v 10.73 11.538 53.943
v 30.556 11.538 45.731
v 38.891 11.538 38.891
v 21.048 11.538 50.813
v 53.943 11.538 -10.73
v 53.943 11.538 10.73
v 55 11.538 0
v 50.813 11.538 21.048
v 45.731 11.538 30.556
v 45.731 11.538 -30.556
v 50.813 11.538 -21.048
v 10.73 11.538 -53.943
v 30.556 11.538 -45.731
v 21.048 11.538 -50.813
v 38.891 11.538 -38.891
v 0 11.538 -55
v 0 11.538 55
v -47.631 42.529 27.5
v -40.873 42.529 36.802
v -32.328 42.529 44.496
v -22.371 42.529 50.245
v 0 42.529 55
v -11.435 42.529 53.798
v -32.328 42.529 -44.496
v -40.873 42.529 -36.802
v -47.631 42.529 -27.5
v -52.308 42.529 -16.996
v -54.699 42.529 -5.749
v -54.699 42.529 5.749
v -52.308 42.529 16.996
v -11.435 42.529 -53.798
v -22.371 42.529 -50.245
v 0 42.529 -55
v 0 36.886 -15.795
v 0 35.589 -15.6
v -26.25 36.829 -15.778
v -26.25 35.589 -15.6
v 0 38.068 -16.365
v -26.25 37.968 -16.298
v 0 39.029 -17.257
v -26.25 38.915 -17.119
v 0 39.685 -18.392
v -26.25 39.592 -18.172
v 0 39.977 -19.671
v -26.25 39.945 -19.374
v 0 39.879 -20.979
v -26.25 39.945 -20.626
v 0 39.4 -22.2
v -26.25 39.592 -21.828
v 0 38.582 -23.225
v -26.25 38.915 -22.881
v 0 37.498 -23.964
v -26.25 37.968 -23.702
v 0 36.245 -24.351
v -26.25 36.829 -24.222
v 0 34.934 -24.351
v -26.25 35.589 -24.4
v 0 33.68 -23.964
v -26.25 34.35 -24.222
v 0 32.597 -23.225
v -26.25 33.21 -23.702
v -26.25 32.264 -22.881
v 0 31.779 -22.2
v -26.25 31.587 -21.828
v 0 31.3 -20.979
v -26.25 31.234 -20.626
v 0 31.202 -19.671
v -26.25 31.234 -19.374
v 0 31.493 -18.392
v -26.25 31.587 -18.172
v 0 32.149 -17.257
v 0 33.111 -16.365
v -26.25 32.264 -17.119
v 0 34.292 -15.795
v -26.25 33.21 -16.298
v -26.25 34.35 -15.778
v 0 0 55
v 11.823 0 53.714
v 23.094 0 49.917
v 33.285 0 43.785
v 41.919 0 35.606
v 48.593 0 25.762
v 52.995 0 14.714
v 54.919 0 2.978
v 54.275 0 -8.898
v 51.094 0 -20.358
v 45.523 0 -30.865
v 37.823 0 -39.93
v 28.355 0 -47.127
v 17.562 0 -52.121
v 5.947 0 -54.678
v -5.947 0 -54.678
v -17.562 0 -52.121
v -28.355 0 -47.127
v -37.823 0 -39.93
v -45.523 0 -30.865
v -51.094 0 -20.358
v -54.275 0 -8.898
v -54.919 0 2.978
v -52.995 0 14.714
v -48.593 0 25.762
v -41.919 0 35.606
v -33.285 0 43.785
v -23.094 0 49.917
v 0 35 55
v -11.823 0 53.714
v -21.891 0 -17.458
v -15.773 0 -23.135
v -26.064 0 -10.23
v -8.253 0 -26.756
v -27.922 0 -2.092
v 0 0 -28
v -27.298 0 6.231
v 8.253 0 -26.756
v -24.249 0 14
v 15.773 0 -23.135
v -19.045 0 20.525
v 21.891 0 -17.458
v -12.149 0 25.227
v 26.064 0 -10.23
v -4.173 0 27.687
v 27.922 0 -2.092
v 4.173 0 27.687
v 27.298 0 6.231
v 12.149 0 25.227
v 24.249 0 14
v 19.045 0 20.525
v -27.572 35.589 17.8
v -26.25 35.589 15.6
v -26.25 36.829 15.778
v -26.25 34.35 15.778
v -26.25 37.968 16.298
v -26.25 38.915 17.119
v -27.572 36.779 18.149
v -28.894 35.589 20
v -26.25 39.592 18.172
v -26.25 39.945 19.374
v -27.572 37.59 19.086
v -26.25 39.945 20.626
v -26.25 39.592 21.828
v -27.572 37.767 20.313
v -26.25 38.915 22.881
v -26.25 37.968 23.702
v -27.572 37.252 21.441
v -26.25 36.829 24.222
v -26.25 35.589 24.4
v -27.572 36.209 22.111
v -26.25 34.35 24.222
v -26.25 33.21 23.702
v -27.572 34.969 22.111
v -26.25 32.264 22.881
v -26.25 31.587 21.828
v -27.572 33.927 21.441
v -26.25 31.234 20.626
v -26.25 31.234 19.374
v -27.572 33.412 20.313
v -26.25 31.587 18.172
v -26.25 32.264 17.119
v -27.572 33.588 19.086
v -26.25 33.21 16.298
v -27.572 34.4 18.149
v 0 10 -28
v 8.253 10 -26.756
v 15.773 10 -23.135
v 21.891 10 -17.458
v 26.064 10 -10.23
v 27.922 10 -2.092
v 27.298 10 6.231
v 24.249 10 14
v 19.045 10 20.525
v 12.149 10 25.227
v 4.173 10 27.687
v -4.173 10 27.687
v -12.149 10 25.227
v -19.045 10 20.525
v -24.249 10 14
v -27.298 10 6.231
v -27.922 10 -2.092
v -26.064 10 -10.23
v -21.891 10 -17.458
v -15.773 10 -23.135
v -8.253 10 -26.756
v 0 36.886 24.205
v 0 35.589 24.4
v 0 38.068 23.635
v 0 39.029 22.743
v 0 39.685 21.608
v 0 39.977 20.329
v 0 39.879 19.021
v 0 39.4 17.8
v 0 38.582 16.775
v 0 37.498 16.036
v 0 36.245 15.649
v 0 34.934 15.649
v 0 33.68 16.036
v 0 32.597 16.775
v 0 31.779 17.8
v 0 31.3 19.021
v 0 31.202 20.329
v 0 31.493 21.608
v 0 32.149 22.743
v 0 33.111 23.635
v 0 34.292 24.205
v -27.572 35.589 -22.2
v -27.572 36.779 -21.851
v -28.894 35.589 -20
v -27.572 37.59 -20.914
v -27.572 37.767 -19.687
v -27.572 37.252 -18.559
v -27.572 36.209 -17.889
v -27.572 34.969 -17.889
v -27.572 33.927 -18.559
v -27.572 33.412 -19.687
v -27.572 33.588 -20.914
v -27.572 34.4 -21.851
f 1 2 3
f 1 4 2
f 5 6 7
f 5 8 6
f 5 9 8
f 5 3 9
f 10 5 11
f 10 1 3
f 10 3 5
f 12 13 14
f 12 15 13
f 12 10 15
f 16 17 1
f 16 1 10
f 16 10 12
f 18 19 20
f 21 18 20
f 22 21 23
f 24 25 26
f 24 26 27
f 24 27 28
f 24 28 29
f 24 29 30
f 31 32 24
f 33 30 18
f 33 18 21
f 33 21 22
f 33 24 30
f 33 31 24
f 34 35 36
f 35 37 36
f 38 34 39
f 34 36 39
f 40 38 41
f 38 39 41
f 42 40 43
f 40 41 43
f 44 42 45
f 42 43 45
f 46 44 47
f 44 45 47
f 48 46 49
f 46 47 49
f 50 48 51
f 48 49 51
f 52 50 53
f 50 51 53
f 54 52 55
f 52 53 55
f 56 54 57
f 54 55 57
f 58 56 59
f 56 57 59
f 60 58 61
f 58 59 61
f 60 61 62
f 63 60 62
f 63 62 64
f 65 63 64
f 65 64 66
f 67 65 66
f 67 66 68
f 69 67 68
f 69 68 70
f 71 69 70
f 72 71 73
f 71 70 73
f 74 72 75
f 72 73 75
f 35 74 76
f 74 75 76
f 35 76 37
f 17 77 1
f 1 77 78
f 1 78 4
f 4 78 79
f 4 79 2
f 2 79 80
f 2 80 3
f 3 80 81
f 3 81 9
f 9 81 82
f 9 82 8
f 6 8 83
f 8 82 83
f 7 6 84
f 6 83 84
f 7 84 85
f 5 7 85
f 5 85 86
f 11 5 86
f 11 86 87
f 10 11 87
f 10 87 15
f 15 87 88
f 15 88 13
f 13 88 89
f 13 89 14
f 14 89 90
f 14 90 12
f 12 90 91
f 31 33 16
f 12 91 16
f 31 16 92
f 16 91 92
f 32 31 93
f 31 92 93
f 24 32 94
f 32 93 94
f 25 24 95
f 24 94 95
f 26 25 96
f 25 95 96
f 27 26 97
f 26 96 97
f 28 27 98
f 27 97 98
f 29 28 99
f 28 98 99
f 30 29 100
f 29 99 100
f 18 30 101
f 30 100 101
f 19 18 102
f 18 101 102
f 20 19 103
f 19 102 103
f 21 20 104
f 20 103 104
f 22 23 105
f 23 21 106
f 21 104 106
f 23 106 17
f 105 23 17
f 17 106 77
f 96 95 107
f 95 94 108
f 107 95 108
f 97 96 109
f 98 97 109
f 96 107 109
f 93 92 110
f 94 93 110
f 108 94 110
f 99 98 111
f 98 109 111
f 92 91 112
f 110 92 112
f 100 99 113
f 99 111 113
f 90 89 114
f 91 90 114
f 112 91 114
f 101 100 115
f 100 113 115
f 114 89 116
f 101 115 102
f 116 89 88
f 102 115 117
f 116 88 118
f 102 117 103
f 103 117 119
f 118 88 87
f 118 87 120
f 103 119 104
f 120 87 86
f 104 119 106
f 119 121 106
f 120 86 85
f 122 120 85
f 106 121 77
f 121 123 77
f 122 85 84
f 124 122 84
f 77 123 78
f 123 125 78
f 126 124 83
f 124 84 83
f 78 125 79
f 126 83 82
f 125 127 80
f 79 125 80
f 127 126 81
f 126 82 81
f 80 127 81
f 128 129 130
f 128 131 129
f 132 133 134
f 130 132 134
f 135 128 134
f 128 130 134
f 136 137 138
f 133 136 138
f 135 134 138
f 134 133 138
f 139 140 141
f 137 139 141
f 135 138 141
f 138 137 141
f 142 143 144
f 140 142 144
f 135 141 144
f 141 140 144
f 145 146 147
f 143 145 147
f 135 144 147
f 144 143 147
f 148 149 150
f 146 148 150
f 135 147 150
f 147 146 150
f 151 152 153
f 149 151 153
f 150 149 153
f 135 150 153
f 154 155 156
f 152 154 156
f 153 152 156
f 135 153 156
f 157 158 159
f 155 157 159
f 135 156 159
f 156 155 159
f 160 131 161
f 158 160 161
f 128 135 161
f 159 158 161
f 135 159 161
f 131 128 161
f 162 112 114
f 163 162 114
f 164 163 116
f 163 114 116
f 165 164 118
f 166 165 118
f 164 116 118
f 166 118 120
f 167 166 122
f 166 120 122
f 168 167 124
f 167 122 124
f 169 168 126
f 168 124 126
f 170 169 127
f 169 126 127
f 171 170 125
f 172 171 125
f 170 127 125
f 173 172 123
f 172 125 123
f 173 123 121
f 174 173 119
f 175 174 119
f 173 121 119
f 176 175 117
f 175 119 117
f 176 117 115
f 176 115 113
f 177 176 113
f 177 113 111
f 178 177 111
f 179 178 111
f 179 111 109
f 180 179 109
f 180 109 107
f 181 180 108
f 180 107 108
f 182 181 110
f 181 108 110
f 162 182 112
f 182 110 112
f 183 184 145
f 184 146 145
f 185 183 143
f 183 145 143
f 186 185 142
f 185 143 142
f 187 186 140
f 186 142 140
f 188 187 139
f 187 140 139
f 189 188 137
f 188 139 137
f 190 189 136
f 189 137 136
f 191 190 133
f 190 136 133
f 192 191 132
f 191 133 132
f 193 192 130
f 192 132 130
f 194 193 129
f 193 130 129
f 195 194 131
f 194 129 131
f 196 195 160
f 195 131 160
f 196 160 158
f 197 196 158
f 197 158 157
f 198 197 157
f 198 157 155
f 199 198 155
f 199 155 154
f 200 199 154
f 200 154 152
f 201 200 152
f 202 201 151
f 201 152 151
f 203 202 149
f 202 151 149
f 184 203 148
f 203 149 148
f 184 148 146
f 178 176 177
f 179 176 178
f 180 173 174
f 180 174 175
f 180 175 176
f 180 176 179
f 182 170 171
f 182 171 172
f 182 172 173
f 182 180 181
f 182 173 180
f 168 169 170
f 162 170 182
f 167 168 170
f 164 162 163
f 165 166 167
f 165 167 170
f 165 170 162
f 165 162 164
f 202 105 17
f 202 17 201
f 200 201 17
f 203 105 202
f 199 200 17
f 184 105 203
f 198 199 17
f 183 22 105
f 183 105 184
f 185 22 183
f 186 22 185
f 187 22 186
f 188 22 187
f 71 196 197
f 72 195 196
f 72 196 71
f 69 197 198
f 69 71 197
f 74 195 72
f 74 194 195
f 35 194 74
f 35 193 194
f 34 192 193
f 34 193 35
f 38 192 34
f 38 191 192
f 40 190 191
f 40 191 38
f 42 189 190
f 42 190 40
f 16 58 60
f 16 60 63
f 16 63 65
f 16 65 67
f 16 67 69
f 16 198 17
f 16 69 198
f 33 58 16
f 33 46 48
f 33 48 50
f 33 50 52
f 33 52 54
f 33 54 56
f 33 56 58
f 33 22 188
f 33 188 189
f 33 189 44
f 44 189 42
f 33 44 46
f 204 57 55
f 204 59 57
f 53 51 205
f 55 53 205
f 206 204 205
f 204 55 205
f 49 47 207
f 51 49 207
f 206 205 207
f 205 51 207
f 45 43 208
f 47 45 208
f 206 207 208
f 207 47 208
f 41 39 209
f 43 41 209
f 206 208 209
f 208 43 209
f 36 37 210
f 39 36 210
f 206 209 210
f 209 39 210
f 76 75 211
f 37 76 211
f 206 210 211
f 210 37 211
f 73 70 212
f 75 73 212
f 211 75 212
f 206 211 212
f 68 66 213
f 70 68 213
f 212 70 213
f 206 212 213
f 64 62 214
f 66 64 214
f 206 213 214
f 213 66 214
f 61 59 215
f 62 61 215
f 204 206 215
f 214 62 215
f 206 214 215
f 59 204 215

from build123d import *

# Parameters (mm, degrees)
SCHIZZO1_R                      = 55
ESTRUSIONE_ESTRUSIONE1_DEPTH    = 35
SCHIZZO2_R                      = 28
TAGLIO_ESTRUSIONE1_DEPTH        = 10
SWEEP1_START                    = 35
SWEEP1_OUTLINE_R                = 55
SWEEP1_DEPTH                    = 7.529292994
SCHIZZO10_W                     = 110
SCHIZZO10_H                     = 30.991723426
TAGLIO_ESTRUSIONE3_DEPTH        = 70
FORO_FILETTATO_M10X1_25_1_D     = 8.8
FORO_FILETTATO_M10X1_25_1_DEPTH = 26.25
FORO_FILETTATO_M10X1_25_1_TIP   = 2.643786724


# Read off the part's stored shape, not the designer's step: Sweep1
with BuildPart() as part:
    # Schizzo1 → Estrusione-Estrusione1 (new body)
    with BuildSketch(Plane(origin=(0, 0, 0), x_dir=(1, 0, 0), z_dir=(0, 1, 0))):
        with Locations(Location((0, 0, 0), (0, 0, 270))):
            Circle(SCHIZZO1_R)
    extrude(amount=ESTRUSIONE_ESTRUSIONE1_DEPTH)

    # Schizzo2 → Taglio-Estrusione1 (cut)
    with BuildSketch(Plane(origin=(0, 0, 0), x_dir=(-1, 0, 0), z_dir=(0, -1, 0))):
        with Locations(Location((0, 0, 0), (0, 0, 90))):
            Circle(SCHIZZO2_R)
    extrude(amount=-TAGLIO_ESTRUSIONE1_DEPTH, mode=Mode.SUBTRACT)

    # Sweep1 outline → Sweep1 (add)
    with BuildSketch(Plane(origin=(0, 0, 0), x_dir=(1, 0, 0), z_dir=(0, 1, 0)).offset(SWEEP1_START)):
        Circle(SWEEP1_OUTLINE_R)
    extrude(amount=SWEEP1_DEPTH)

    # Schizzo10 → Taglio-Estrusione3 (cut)
    with BuildSketch(Plane(origin=(0, 0, 0), x_dir=(0, 0, -1), z_dir=(1, 0, 0))):
        with Locations((0, 27.033431281)):
            Rectangle(SCHIZZO10_W, SCHIZZO10_H)
    extrude(amount=TAGLIO_ESTRUSIONE3_DEPTH, mode=Mode.SUBTRACT)

    # Foro filettato M10x1.25-1
    with Locations(Plane(origin=(0, 0, 0), x_dir=(0, 0, -1), z_dir=(1, 0, 0))):
        with Locations((-20, 35.589292994), (20, 35.589292994)):
            Hole(FORO_FILETTATO_M10X1_25_1_D / 2, depth=FORO_FILETTATO_M10X1_25_1_DEPTH)
            with Locations((0, 0, -(FORO_FILETTATO_M10X1_25_1_DEPTH + FORO_FILETTATO_M10X1_25_1_TIP / 2))):  # 118° drill point
                Cone(0, FORO_FILETTATO_M10X1_25_1_D / 2, FORO_FILETTATO_M10X1_25_1_TIP, mode=Mode.SUBTRACT)


solid = part.part
